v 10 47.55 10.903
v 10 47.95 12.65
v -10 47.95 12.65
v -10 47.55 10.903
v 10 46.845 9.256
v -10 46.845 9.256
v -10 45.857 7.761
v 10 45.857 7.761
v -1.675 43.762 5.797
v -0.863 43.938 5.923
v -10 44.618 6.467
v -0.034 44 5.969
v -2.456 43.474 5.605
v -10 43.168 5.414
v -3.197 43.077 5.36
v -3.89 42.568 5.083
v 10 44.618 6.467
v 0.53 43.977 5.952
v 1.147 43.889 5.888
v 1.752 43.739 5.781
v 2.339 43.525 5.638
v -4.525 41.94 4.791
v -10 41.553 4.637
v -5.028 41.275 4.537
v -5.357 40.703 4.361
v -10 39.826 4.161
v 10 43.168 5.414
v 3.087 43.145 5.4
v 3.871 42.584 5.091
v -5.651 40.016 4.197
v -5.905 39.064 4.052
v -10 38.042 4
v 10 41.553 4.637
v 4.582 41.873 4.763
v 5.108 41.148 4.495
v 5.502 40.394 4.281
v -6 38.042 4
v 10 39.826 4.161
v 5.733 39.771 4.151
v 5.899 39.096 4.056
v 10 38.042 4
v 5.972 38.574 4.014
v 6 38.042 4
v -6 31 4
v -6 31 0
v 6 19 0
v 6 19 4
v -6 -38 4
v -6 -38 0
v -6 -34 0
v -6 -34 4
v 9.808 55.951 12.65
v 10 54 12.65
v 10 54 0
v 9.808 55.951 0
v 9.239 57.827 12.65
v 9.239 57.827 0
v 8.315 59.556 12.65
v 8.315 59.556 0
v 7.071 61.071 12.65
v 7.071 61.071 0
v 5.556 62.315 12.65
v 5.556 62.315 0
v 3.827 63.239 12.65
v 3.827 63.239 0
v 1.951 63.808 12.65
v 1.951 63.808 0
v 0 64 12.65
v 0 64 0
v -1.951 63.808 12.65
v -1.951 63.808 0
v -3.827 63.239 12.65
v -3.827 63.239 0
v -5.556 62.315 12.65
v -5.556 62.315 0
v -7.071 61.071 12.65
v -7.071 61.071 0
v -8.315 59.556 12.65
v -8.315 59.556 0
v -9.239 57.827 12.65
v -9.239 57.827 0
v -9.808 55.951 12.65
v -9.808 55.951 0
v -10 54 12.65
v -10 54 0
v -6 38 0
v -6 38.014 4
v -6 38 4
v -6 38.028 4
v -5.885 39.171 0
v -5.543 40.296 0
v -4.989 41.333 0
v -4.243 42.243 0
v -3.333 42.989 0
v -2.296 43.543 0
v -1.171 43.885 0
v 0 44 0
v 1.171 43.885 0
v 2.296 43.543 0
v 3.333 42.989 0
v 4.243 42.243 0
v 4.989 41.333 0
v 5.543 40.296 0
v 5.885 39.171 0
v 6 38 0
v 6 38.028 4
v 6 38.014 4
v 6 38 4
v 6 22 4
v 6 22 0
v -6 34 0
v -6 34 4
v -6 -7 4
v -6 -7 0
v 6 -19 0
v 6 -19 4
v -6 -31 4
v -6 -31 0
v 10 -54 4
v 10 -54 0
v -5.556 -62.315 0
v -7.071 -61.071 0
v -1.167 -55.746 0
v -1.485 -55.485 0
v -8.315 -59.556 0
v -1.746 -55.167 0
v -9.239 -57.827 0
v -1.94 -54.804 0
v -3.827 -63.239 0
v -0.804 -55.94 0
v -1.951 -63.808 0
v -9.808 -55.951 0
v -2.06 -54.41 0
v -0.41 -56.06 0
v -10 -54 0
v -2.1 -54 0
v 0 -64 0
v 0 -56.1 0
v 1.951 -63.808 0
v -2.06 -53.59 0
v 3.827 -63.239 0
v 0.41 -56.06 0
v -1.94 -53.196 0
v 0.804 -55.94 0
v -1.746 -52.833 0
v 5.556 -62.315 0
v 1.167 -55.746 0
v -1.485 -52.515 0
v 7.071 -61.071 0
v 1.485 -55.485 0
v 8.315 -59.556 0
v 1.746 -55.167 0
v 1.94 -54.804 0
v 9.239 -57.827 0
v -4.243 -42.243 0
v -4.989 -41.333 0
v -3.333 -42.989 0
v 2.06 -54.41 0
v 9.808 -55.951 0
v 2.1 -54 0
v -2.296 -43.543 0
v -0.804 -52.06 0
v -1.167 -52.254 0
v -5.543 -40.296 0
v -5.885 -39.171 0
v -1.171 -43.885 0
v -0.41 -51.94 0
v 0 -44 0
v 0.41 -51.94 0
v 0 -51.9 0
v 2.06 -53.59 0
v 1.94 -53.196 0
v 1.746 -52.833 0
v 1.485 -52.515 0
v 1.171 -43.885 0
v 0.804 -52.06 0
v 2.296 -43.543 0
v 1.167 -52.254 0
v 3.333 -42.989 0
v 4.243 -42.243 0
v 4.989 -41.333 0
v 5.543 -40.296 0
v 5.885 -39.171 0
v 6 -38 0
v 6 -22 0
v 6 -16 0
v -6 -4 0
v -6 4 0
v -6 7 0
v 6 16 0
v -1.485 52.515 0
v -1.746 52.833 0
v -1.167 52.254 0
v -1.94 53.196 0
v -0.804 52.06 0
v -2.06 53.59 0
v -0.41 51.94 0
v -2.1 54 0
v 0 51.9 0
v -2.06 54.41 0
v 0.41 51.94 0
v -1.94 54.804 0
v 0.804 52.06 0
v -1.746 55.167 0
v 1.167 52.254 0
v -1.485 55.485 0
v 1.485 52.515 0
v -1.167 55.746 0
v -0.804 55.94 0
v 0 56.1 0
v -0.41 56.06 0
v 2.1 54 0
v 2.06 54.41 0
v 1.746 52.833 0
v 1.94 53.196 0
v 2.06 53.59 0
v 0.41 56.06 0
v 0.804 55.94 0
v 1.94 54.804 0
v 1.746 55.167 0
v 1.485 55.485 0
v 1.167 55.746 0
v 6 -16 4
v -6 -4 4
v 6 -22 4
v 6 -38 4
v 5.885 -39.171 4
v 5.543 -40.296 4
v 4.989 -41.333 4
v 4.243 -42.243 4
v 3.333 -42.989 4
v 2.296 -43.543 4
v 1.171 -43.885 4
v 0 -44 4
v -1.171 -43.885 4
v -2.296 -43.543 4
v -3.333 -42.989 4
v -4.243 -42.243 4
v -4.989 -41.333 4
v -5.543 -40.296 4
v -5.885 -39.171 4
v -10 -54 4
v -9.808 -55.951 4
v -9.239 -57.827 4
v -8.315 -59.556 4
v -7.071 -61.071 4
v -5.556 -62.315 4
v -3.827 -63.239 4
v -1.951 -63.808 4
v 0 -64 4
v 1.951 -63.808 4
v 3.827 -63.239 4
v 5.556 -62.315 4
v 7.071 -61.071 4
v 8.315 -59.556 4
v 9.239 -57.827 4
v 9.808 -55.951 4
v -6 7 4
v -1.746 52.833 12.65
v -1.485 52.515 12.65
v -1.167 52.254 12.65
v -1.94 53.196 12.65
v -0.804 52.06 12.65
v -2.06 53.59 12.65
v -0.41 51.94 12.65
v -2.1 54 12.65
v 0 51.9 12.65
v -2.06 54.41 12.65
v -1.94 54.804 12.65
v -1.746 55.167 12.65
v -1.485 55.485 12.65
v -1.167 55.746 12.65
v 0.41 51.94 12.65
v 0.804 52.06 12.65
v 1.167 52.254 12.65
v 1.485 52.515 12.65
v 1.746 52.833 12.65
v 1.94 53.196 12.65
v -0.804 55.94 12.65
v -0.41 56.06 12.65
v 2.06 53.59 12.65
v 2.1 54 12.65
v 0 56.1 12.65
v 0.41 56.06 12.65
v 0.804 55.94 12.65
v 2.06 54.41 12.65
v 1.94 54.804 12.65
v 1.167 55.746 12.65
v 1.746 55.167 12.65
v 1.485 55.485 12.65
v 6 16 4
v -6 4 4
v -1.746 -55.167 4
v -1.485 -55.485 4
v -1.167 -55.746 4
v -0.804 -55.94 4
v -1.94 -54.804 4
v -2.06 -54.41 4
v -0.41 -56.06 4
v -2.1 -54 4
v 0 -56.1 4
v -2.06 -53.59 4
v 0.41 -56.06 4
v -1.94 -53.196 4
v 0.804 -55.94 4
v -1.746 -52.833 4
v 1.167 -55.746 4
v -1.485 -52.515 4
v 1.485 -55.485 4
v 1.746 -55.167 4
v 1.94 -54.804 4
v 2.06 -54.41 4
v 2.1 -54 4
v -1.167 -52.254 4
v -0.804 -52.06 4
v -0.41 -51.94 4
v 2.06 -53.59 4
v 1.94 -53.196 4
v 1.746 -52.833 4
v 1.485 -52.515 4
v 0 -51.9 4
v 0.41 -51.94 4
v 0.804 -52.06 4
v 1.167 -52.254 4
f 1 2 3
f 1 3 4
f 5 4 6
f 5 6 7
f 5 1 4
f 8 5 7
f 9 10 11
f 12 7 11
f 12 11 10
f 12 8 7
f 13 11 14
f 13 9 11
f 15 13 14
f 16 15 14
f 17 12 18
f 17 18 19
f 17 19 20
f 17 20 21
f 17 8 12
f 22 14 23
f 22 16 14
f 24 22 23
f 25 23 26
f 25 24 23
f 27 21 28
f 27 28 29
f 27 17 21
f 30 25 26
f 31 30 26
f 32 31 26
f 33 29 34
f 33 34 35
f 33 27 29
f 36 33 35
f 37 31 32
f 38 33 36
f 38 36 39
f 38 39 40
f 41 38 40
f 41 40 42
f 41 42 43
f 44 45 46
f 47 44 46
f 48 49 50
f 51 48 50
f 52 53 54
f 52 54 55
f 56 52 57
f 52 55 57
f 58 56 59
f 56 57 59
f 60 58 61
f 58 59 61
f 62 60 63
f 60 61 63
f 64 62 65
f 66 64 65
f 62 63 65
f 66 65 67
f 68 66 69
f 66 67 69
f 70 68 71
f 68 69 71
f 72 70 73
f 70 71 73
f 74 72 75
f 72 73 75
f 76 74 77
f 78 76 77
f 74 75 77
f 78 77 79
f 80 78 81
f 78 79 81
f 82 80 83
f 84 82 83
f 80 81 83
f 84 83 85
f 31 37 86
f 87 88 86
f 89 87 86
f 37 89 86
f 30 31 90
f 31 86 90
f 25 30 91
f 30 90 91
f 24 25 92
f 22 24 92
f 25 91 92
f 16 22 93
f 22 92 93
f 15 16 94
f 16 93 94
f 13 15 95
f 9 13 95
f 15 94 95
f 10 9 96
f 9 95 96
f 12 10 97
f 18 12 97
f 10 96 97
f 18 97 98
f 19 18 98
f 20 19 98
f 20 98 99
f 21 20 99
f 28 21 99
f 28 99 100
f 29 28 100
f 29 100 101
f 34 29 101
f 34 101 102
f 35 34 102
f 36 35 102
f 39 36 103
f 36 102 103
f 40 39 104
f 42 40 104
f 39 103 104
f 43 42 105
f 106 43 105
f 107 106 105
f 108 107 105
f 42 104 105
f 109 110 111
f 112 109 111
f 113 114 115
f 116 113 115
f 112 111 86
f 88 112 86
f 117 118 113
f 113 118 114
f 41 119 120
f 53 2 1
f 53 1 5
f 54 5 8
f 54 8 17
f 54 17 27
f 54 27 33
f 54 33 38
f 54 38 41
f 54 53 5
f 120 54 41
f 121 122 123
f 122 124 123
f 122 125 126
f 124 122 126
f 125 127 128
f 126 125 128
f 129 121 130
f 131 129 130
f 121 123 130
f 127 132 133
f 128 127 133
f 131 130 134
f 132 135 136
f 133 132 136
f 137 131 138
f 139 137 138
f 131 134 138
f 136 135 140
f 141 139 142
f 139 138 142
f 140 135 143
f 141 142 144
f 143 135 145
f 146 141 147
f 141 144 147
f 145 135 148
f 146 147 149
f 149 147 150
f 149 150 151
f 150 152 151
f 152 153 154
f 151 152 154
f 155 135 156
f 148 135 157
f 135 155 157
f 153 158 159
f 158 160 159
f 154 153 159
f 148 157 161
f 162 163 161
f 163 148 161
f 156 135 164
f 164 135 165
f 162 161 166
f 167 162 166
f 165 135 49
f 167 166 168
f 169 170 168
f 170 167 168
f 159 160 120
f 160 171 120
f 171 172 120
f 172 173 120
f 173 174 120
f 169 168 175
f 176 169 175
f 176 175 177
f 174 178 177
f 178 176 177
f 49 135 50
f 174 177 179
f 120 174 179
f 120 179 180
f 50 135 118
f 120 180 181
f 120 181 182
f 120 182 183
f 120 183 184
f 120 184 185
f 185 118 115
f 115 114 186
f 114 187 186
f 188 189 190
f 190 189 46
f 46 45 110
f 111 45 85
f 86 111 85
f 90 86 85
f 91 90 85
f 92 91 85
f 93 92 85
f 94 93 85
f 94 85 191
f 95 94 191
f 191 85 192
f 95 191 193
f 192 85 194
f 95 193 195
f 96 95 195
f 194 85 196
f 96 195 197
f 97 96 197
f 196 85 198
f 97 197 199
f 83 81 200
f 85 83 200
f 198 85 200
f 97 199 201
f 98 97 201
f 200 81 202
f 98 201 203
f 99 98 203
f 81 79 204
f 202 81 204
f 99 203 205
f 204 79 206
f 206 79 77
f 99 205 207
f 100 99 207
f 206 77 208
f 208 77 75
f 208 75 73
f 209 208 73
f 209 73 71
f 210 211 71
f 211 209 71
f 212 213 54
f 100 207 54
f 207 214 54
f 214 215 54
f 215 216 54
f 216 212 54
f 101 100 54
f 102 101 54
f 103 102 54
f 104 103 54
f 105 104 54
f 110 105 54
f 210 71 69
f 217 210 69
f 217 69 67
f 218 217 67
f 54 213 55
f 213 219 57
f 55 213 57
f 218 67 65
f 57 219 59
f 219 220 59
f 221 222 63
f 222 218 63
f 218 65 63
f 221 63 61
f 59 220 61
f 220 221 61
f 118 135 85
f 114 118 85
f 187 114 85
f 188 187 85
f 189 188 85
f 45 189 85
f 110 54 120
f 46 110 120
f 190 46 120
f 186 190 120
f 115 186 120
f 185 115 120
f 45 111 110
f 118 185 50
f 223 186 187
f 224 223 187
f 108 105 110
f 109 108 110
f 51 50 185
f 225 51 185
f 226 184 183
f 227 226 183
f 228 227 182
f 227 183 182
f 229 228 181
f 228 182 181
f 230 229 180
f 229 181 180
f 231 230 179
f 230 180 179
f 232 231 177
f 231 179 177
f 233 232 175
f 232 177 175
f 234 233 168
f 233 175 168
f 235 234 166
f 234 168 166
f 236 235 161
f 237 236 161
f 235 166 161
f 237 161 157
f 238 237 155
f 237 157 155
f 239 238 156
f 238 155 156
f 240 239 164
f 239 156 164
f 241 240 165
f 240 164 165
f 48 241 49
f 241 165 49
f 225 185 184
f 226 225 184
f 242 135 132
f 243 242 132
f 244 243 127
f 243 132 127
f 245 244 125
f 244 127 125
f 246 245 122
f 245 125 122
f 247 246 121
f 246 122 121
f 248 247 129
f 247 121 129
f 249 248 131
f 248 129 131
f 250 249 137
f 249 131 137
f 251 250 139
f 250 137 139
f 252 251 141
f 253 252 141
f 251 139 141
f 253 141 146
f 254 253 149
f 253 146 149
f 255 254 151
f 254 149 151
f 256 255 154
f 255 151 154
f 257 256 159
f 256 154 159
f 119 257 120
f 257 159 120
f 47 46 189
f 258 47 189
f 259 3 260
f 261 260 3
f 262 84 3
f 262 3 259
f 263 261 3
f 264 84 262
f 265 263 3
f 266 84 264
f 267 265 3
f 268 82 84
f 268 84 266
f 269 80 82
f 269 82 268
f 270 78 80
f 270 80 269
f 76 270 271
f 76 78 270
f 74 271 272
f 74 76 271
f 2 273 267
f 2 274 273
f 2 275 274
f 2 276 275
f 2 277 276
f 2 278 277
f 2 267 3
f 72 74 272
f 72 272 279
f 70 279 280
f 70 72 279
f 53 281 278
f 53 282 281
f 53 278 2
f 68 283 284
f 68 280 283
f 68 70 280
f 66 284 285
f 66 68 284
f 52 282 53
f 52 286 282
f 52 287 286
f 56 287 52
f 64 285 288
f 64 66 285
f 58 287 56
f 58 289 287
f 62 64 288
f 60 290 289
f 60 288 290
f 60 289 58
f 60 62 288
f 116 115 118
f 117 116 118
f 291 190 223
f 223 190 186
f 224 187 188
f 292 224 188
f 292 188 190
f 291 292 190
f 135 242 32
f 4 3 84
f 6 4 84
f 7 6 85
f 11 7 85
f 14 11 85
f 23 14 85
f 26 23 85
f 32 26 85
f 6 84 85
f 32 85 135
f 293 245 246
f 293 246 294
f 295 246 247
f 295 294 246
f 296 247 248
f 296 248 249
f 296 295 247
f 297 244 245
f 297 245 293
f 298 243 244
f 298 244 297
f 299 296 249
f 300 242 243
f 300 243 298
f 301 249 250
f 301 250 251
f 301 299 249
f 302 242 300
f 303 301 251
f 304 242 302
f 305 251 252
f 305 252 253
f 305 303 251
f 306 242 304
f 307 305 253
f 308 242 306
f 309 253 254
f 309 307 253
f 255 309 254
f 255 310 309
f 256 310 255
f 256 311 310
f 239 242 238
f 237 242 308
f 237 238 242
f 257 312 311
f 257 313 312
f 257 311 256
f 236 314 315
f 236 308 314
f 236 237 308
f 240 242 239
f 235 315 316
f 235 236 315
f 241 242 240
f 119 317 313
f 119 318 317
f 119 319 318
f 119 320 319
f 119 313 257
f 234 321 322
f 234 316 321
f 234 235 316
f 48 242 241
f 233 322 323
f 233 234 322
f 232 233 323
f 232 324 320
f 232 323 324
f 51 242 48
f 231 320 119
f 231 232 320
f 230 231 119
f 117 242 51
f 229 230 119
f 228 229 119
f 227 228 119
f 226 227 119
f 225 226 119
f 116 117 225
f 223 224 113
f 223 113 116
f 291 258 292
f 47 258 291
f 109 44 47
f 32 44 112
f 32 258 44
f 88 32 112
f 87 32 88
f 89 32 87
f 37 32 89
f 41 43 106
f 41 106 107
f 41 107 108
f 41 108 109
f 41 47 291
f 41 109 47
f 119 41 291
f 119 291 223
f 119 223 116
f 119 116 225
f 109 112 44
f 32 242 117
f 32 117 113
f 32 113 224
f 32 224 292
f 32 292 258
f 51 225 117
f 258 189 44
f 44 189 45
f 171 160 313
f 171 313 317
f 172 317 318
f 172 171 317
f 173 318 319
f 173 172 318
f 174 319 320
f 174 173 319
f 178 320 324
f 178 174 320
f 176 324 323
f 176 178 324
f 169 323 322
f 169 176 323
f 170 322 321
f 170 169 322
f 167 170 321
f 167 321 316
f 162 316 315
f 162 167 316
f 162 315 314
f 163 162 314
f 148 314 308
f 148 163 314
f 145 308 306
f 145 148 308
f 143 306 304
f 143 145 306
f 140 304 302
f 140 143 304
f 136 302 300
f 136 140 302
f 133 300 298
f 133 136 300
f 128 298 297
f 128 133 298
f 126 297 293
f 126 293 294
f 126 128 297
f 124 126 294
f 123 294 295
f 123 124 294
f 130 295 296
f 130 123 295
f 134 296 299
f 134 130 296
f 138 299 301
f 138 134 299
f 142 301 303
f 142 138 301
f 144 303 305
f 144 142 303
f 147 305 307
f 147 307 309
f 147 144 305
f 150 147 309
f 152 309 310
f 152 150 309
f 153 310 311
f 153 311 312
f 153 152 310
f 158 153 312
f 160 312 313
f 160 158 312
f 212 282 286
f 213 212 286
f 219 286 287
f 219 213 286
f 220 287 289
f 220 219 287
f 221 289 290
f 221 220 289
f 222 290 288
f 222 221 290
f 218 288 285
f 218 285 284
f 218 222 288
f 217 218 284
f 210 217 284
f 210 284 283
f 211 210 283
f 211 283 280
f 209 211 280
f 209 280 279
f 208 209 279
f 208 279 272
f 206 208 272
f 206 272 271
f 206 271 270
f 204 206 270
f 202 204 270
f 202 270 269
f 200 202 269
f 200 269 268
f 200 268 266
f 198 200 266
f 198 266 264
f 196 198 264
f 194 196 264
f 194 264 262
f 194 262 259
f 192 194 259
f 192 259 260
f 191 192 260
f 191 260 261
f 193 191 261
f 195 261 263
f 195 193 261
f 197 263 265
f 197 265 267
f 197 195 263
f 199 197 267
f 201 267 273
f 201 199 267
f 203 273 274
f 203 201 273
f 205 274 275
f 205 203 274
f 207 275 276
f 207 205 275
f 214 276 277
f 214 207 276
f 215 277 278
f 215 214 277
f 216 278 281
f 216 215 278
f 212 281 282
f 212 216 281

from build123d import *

# Parameters (mm, degrees)
CROQUIS1_R              = 2.1
SALIENTE_EXTRUIR1_DEPTH = 4
CROQUIS1_6_R            = 2.1
SALIENTE_EXTRUIR3_DEPTH = 12.65
REDONDEO1_R             = 10


with BuildPart() as part:
    # Croquis1 → Saliente-Extruir1 (new body)
    with BuildSketch(Plane.XY):
        with BuildLine():
            ThreePointArc((10, 54), (0, 64), (-10, 54))
            Line((-10, 54), (-10, -54))
            ThreePointArc((-10, -54), (0, -64), (10, -54))
            Line((10, -54), (10, 54))
        make_face()
        with Locations((0, 54)):
            Circle(CROQUIS1_R, mode=Mode.SUBTRACT)
        with BuildLine():
            Line((6, 38), (6, 22))
            Line((6, 22), (-6, 34))
            Line((-6, 34), (-6, 38))
            ThreePointArc((-6, 38), (0, 44), (6, 38))
        make_face(mode=Mode.SUBTRACT)
        Polygon((6, 16), (6, -16), (-6, -4), (-6, 4), align=None, mode=Mode.SUBTRACT)
        with BuildLine():
            Line((6, -22), (6, -38))
            ThreePointArc((6, -38), (0, -44), (-6, -38))
            Line((-6, -38), (-6, -34))
            Line((-6, -34), (6, -22))
        make_face(mode=Mode.SUBTRACT)
        Polygon((-6, -31), (-6, -7), (6, -19), align=None, mode=Mode.SUBTRACT)
        Polygon((-6, 7), (-6, 31), (6, 19), align=None, mode=Mode.SUBTRACT)
        with Locations((0, -54)):
            Circle(CROQUIS1_R, mode=Mode.SUBTRACT)
    extrude(amount=SALIENTE_EXTRUIR1_DEPTH)

    # Croquis1<6> → Saliente-Extruir3 (add)
    with BuildSketch(Plane.XY):
        with BuildLine():
            Line((10, 47.95), (10, 54))
            ThreePointArc((10, 54), (0, 64), (-10, 54))
            Line((-10, 54), (-10, 47.95))
            Line((-10, 47.95), (10, 47.95))
        make_face()
        with Locations((0, 54)):
            Circle(CROQUIS1_6_R, mode=Mode.SUBTRACT)
    extrude(amount=SALIENTE_EXTRUIR3_DEPTH)

    # Redondeo1
    # the kernel refuses this fillet: 10 mm, written as the material it adds along each edge
    with BuildSketch(Plane(origin=(10, 47.95, 4), x_dir=(0, 0, 1), z_dir=(-1, 0, 0))) as redondeo1_piece_1_section:
        with BuildLine():
            CenterArc((10, -9.908455985), REDONDEO1_R, 97.758619889, 82.241380111)
            Line((0, -9.908455985), (-0.2, -9.908455985))
            Line((-0.2, -9.908455985), (-0.2, 0))
            Line((-0.2, 0), (0, 0.2))
            ThreePointArc((0, 0.2), (4.325, 0.2), (8.623, 0.19816912))
            Line((8.623, 0.19816912), (8.65, 0))
        make_face()
    redondeo1_piece_1 = extrude(amount=20, mode=Mode.PRIVATE)
    redondeo1_piece_1 = redondeo1_piece_1 - Plane(origin=(0, 38, 6.259394391), x_dir=(-1, 0, 0), z_dir=(0, 0, -1)) * Cylinder(6, 80, mode=Mode.PRIVATE)
    add(redondeo1_piece_1)


solid = part.part
